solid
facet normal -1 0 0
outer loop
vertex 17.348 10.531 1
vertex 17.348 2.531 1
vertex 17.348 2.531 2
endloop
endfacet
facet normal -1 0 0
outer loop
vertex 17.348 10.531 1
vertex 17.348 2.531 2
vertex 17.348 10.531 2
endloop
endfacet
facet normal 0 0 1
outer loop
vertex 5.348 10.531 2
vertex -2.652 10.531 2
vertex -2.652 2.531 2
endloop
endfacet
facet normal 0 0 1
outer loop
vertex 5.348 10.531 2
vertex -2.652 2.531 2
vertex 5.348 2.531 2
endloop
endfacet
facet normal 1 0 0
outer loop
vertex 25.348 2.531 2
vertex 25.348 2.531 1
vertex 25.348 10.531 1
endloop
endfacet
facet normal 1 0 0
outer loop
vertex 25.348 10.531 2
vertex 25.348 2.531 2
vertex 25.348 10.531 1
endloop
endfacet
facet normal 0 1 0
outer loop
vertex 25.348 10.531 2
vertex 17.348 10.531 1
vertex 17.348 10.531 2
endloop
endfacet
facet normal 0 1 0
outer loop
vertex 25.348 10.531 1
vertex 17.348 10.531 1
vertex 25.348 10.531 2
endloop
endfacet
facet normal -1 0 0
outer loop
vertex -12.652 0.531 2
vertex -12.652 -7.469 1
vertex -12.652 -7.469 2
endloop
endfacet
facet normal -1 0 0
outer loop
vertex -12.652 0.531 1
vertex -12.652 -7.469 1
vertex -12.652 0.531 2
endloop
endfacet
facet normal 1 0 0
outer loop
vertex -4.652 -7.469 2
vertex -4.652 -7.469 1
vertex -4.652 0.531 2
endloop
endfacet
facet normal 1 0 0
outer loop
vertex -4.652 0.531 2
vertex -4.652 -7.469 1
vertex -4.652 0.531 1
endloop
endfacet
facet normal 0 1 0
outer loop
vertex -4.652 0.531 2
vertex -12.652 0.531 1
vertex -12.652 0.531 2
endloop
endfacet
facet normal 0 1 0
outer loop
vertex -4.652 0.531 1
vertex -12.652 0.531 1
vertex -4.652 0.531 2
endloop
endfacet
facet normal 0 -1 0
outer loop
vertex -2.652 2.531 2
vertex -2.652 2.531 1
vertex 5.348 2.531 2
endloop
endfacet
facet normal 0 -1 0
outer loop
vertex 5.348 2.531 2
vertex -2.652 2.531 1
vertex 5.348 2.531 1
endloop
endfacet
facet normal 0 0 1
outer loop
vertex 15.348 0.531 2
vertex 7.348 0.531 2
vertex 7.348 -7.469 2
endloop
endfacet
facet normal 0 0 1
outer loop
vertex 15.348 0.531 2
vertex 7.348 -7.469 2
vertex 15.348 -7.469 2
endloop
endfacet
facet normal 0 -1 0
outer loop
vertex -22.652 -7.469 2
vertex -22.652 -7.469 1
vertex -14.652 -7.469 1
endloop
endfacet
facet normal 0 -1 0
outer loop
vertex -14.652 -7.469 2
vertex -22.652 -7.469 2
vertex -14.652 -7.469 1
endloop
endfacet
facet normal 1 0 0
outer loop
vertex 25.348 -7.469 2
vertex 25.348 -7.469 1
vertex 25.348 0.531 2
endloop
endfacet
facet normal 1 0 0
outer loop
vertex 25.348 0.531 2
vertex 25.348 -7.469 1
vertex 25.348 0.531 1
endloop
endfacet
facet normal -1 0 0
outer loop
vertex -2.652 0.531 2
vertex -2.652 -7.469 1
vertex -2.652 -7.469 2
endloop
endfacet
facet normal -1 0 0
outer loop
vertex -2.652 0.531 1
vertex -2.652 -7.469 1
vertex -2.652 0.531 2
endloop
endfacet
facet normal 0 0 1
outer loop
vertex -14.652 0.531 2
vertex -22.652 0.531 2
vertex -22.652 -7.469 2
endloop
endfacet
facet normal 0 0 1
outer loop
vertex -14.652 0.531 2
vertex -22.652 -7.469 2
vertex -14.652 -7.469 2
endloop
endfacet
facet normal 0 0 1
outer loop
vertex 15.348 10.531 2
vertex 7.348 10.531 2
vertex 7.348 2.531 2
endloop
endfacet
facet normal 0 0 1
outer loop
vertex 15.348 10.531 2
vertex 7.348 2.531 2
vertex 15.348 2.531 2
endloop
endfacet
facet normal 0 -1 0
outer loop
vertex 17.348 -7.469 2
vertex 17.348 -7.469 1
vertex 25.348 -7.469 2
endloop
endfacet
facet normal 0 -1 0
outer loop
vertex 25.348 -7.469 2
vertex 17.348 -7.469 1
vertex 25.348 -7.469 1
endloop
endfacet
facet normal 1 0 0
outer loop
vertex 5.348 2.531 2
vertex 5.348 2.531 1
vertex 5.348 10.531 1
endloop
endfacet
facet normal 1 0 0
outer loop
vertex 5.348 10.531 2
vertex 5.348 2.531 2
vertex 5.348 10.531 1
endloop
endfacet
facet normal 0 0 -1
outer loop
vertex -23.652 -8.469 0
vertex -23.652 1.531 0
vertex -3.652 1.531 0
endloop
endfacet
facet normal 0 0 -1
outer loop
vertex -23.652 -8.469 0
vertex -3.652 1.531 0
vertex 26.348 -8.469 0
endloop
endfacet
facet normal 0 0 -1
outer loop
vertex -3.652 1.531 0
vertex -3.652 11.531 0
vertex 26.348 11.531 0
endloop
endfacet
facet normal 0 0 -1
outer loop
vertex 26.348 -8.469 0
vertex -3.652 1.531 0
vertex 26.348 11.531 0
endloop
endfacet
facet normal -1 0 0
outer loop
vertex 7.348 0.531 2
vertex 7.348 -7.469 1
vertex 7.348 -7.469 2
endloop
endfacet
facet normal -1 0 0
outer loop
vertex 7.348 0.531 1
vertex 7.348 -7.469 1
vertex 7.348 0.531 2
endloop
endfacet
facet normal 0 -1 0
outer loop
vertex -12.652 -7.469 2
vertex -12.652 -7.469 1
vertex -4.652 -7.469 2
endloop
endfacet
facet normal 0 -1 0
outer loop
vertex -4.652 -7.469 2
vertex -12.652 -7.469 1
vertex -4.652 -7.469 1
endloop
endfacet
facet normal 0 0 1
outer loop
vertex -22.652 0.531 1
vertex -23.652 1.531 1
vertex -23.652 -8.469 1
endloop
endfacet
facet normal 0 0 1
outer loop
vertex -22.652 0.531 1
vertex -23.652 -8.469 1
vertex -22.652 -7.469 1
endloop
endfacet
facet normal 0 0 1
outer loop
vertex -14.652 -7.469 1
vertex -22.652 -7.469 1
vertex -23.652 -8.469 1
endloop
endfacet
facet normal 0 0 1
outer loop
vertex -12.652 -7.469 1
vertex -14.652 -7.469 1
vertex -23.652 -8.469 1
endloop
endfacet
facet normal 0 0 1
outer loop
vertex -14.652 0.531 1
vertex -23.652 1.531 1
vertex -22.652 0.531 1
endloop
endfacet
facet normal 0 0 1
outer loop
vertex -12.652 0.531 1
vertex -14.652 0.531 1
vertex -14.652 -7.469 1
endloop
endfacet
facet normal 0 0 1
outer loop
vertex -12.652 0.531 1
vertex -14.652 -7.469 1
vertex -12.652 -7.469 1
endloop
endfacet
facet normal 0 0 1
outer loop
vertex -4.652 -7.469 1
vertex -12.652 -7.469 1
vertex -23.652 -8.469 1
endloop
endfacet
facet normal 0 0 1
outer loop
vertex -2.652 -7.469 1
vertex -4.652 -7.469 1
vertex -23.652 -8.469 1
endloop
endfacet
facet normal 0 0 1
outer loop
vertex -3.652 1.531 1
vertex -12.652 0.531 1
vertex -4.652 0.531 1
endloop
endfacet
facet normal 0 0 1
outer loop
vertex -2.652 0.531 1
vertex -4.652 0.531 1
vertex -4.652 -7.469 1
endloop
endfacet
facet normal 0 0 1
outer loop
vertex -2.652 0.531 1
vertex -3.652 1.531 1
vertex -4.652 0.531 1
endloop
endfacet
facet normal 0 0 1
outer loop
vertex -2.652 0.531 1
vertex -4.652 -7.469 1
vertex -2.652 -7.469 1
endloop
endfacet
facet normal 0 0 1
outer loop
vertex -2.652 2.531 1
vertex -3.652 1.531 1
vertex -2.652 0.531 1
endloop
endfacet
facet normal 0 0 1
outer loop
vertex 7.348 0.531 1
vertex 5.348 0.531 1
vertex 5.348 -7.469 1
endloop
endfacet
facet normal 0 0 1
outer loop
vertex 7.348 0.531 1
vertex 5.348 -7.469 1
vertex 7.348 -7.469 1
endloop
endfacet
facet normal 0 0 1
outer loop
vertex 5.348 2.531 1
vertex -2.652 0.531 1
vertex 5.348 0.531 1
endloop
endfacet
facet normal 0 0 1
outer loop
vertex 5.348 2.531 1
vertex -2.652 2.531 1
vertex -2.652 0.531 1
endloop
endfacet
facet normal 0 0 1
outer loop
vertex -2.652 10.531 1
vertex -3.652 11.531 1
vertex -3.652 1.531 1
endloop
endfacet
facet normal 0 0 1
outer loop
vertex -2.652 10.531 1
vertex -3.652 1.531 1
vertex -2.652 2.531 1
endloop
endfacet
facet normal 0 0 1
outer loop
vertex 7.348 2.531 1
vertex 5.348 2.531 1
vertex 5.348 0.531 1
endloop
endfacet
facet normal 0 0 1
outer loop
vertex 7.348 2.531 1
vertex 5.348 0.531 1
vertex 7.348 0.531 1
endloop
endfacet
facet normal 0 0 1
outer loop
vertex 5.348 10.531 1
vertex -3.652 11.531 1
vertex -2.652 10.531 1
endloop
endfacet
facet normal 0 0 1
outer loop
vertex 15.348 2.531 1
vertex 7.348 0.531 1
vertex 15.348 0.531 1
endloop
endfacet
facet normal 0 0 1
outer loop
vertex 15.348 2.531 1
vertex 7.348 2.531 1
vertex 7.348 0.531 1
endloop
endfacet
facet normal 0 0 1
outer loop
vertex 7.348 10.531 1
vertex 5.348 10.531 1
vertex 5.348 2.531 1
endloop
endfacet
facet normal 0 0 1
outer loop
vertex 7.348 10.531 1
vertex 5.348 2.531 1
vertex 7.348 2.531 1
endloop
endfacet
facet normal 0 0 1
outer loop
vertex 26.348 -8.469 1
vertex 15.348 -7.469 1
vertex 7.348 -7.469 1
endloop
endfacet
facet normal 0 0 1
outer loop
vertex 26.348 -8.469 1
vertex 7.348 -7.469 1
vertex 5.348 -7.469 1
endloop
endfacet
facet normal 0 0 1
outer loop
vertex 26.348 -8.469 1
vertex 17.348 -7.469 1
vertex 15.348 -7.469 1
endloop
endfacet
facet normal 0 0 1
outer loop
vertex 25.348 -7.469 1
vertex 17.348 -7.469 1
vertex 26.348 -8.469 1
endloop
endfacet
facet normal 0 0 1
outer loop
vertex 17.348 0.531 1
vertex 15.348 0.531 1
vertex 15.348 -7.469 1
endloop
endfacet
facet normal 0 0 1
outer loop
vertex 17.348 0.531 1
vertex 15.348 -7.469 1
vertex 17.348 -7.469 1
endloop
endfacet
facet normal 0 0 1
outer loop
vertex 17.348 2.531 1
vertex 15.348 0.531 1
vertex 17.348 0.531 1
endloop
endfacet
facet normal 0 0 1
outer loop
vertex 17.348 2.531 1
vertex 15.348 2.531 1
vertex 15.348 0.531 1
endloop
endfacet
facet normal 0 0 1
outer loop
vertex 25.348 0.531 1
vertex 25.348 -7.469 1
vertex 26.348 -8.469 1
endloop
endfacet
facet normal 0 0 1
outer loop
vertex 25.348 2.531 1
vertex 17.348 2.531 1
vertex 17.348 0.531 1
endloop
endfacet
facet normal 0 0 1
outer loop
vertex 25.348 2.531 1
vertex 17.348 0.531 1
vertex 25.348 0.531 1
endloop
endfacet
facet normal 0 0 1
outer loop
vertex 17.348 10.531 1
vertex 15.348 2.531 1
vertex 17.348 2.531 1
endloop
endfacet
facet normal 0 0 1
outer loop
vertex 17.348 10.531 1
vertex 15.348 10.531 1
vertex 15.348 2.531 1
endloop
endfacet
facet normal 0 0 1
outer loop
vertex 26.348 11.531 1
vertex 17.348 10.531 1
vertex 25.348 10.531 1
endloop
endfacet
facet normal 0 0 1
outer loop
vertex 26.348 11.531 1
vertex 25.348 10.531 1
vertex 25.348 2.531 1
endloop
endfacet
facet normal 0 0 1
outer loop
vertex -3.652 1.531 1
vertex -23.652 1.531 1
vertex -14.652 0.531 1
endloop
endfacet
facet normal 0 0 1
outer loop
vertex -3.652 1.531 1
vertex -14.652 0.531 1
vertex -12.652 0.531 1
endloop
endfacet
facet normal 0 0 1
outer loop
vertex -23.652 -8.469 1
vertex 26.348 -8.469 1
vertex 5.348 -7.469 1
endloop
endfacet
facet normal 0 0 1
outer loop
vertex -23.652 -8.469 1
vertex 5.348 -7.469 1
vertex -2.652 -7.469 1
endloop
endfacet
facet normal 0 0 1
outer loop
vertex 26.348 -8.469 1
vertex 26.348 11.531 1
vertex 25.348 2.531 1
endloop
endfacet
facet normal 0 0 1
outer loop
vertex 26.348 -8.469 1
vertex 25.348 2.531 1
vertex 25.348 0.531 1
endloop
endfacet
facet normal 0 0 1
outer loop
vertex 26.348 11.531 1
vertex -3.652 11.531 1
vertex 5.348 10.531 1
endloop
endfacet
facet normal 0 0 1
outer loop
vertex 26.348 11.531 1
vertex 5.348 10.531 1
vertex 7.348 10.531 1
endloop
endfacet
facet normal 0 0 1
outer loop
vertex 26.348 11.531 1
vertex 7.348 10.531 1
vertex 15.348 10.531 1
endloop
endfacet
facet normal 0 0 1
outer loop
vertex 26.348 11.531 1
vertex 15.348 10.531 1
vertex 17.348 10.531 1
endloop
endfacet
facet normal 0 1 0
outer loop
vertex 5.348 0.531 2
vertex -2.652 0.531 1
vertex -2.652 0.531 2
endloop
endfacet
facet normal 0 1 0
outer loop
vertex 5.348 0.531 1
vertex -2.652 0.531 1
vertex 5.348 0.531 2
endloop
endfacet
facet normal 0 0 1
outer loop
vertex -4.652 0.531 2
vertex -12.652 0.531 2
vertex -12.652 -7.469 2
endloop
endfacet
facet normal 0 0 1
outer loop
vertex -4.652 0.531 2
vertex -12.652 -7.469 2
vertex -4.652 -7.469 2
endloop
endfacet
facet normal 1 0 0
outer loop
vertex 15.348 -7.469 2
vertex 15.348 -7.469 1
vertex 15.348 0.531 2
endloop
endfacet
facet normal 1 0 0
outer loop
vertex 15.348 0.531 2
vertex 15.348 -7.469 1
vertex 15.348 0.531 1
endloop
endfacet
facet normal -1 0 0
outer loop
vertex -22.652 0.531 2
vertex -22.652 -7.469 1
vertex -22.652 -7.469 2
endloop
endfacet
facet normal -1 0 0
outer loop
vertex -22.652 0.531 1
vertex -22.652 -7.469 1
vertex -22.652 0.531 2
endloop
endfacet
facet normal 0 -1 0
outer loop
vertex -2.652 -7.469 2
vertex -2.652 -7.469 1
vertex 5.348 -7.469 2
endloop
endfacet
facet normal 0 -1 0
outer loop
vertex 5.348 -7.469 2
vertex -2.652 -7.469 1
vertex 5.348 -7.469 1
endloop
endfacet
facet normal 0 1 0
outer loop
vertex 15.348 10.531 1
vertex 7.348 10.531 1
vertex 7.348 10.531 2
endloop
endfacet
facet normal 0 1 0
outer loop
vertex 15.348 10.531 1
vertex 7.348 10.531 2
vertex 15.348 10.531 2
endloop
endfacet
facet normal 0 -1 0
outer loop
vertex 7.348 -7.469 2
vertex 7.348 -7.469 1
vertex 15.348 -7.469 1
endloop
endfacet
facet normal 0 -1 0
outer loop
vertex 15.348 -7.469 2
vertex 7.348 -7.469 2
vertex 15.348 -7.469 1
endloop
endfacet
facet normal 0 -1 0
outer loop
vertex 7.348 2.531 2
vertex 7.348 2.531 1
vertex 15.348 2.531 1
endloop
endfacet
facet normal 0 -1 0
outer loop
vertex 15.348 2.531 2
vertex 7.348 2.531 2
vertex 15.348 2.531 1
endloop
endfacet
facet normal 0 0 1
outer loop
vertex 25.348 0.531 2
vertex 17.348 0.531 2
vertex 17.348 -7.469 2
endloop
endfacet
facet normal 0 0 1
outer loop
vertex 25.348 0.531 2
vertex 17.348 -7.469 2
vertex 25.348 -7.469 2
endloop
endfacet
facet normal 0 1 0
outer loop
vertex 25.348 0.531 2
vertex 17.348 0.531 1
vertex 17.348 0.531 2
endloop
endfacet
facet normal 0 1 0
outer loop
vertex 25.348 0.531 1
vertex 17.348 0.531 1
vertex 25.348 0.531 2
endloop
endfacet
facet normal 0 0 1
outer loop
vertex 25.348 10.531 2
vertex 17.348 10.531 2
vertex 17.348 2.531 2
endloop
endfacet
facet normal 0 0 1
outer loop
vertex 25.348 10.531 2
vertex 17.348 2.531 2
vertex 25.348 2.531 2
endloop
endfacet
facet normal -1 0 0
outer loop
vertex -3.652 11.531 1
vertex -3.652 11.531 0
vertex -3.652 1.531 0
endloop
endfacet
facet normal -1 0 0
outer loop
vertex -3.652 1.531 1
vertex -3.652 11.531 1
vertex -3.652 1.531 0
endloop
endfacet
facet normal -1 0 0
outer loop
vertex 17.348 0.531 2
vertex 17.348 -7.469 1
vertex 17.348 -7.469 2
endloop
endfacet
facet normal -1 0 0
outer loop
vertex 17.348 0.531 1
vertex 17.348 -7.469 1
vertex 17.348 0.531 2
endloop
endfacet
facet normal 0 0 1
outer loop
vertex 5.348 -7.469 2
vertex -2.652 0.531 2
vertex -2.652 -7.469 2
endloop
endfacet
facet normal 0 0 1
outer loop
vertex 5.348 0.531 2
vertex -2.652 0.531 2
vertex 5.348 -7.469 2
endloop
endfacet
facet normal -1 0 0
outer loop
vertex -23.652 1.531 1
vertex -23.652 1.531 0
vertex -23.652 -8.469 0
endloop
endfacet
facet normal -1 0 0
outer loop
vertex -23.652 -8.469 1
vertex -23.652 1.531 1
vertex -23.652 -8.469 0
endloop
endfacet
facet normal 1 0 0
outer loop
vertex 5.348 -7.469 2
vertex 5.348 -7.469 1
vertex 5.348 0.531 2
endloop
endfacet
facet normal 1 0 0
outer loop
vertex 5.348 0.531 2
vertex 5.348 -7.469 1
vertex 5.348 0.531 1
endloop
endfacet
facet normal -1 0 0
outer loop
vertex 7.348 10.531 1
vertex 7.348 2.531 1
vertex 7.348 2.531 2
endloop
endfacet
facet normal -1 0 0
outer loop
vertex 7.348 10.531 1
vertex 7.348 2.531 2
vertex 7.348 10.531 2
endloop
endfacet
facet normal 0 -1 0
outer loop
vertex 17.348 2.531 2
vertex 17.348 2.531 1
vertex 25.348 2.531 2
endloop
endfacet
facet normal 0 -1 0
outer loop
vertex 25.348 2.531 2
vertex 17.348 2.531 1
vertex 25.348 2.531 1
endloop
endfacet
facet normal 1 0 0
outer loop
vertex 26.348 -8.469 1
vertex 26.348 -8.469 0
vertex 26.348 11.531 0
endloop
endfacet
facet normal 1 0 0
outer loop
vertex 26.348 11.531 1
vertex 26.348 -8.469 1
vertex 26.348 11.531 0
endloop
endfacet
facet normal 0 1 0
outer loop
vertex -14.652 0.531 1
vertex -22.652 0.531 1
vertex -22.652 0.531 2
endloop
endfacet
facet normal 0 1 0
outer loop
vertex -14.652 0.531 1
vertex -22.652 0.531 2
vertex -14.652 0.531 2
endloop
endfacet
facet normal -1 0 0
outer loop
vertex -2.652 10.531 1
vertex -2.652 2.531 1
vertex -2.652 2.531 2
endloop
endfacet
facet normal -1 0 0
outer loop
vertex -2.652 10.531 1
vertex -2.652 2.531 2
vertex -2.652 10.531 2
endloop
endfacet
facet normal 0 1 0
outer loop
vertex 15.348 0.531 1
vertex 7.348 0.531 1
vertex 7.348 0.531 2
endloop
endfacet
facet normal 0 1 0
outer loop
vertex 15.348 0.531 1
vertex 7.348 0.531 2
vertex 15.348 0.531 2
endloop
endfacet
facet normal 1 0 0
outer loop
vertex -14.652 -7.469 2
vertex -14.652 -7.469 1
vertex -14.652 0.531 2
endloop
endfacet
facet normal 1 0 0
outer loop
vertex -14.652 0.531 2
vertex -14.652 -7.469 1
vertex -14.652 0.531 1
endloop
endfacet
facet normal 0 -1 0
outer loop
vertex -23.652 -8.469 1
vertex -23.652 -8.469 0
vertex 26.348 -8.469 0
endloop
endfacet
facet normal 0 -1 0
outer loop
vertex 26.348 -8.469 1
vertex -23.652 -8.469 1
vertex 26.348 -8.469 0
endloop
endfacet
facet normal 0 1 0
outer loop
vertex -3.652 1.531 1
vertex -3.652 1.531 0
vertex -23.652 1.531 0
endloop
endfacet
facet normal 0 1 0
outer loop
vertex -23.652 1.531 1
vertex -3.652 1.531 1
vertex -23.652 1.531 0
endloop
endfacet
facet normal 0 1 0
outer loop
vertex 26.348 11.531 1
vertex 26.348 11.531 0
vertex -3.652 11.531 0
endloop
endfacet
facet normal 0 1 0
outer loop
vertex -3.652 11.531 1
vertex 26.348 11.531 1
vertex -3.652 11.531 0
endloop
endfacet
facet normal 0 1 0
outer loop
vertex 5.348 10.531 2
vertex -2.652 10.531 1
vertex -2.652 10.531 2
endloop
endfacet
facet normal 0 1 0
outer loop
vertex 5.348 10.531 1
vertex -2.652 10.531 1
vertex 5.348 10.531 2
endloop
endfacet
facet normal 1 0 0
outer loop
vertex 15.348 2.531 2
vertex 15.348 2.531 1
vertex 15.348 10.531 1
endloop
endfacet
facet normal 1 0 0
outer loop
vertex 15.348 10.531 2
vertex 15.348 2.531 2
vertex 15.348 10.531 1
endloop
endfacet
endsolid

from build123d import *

# Parameters (mm, degrees)
F1_DEPTH = 1
F2_W     = 8
F2_H     = 8
F3_DEPTH = 1


# Not quite as in the source:
# - a feature names something its author has since deleted; it is built from what else it names


with BuildPart() as f1:
    # F0 (on Top) → F1 (new body)
    with BuildSketch(Plane.XY):
        Polygon((-3.6520181931, 1.5305465425), (-23.6520181931, 1.5305465425), (-23.6520181931, -8.4694534575), (26.3479818069, -8.4694534575), (26.3479818069, 11.5305465425), (-3.6520181931, 11.5305465425), align=None)
    extrude(amount=F1_DEPTH)

    # F2 (on face) → F3 (join)
    with BuildSketch(Plane.XY.offset(1)):
        with Locations((-18.6520181931, -3.4694534575)):
            Rectangle(F2_W, F2_H)
        with Locations((-8.6520181931, -3.4694534575)):
            Rectangle(F2_W, F2_H)
        with Locations((1.3479818069, 6.5305465425)):
            Rectangle(F2_W, F2_H)
        with Locations((11.3479818069, 6.5305465425)):
            Rectangle(F2_W, F2_H)
        with Locations((11.3479818069, -3.4694534575)):
            Rectangle(F2_W, F2_H)
        with Locations((21.3479818069, -3.4694534575)):
            Rectangle(F2_W, F2_H)
        with Locations((21.3479818069, 6.5305465425)):
            Rectangle(F2_W, F2_H)
        with Locations((1.3479818069, -3.4694534575)):
            Rectangle(F2_W, F2_H)
    extrude(amount=F3_DEPTH)


solid = f1.part
